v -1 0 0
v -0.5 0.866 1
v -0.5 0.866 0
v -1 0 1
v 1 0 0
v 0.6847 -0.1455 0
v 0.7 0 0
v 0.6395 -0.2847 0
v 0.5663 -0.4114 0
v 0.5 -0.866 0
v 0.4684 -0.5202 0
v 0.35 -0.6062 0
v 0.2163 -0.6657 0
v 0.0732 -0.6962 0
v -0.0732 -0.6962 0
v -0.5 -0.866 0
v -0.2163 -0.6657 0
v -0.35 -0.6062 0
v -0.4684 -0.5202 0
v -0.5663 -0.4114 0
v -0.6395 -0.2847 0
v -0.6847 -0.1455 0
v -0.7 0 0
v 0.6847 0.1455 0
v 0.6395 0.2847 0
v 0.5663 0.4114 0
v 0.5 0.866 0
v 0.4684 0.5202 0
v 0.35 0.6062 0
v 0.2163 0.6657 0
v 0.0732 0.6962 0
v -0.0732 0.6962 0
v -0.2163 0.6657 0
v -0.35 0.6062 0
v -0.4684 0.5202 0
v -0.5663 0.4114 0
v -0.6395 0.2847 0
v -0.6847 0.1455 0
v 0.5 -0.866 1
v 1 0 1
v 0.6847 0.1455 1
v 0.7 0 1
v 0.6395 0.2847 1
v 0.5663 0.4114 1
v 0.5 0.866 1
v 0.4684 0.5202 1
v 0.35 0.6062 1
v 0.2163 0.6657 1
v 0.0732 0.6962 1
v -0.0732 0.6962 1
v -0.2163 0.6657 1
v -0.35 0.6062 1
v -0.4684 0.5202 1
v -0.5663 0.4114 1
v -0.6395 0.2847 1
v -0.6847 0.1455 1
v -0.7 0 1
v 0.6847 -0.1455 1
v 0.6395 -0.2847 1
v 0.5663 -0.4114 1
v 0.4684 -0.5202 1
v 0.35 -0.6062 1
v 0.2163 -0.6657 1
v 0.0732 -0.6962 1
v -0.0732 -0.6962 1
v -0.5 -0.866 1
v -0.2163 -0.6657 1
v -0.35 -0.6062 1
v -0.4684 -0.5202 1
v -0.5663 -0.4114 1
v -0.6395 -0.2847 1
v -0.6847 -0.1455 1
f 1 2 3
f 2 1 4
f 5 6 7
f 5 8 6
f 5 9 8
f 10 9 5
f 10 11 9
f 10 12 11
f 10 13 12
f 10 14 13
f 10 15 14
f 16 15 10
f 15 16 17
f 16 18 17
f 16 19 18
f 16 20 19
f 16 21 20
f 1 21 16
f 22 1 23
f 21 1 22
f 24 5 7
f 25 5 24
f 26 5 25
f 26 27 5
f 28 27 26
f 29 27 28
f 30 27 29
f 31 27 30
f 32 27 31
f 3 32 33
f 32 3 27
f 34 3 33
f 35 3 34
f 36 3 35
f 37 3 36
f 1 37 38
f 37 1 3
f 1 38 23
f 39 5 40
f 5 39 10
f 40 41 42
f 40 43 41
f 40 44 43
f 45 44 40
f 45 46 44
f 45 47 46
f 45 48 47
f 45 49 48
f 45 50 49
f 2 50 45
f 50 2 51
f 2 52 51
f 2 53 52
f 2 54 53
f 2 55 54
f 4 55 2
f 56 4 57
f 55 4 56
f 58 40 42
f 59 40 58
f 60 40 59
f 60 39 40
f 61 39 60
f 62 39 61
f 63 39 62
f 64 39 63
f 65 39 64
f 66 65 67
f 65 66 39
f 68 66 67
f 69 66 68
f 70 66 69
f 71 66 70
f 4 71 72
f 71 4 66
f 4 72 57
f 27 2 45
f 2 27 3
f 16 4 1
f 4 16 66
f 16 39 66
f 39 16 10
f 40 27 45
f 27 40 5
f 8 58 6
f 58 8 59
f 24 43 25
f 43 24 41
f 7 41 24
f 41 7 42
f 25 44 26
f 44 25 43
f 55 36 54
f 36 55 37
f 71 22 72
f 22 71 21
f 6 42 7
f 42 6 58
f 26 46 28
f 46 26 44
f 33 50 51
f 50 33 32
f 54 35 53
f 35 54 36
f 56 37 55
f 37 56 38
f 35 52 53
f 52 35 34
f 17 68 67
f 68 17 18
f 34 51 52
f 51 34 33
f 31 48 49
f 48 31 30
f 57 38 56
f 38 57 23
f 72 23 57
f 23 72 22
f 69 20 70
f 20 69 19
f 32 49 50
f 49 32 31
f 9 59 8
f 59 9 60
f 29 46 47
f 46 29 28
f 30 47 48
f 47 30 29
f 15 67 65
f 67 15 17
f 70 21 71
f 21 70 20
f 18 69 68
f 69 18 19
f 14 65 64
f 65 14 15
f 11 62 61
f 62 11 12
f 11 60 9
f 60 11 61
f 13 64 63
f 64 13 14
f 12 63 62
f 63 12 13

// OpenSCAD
module Nut_LQ(){

    module regular_polygon(order = 6, r=1){
         angles=[ for (i = [0:order-1]) i*(360/order) ];
         coords=[ for (th=angles) [r*cos(th), r*sin(th)] ];
         polygon(coords);
     }
         
    color("#a8b0b2"){
 
        difference(){
        linear_extrude(height =1){
             regular_polygon(order = 6);
             }
             cylinder(2.1,0.7,0.7,center = true, $fn=30);
             }
    }
}

Nut_LQ();
